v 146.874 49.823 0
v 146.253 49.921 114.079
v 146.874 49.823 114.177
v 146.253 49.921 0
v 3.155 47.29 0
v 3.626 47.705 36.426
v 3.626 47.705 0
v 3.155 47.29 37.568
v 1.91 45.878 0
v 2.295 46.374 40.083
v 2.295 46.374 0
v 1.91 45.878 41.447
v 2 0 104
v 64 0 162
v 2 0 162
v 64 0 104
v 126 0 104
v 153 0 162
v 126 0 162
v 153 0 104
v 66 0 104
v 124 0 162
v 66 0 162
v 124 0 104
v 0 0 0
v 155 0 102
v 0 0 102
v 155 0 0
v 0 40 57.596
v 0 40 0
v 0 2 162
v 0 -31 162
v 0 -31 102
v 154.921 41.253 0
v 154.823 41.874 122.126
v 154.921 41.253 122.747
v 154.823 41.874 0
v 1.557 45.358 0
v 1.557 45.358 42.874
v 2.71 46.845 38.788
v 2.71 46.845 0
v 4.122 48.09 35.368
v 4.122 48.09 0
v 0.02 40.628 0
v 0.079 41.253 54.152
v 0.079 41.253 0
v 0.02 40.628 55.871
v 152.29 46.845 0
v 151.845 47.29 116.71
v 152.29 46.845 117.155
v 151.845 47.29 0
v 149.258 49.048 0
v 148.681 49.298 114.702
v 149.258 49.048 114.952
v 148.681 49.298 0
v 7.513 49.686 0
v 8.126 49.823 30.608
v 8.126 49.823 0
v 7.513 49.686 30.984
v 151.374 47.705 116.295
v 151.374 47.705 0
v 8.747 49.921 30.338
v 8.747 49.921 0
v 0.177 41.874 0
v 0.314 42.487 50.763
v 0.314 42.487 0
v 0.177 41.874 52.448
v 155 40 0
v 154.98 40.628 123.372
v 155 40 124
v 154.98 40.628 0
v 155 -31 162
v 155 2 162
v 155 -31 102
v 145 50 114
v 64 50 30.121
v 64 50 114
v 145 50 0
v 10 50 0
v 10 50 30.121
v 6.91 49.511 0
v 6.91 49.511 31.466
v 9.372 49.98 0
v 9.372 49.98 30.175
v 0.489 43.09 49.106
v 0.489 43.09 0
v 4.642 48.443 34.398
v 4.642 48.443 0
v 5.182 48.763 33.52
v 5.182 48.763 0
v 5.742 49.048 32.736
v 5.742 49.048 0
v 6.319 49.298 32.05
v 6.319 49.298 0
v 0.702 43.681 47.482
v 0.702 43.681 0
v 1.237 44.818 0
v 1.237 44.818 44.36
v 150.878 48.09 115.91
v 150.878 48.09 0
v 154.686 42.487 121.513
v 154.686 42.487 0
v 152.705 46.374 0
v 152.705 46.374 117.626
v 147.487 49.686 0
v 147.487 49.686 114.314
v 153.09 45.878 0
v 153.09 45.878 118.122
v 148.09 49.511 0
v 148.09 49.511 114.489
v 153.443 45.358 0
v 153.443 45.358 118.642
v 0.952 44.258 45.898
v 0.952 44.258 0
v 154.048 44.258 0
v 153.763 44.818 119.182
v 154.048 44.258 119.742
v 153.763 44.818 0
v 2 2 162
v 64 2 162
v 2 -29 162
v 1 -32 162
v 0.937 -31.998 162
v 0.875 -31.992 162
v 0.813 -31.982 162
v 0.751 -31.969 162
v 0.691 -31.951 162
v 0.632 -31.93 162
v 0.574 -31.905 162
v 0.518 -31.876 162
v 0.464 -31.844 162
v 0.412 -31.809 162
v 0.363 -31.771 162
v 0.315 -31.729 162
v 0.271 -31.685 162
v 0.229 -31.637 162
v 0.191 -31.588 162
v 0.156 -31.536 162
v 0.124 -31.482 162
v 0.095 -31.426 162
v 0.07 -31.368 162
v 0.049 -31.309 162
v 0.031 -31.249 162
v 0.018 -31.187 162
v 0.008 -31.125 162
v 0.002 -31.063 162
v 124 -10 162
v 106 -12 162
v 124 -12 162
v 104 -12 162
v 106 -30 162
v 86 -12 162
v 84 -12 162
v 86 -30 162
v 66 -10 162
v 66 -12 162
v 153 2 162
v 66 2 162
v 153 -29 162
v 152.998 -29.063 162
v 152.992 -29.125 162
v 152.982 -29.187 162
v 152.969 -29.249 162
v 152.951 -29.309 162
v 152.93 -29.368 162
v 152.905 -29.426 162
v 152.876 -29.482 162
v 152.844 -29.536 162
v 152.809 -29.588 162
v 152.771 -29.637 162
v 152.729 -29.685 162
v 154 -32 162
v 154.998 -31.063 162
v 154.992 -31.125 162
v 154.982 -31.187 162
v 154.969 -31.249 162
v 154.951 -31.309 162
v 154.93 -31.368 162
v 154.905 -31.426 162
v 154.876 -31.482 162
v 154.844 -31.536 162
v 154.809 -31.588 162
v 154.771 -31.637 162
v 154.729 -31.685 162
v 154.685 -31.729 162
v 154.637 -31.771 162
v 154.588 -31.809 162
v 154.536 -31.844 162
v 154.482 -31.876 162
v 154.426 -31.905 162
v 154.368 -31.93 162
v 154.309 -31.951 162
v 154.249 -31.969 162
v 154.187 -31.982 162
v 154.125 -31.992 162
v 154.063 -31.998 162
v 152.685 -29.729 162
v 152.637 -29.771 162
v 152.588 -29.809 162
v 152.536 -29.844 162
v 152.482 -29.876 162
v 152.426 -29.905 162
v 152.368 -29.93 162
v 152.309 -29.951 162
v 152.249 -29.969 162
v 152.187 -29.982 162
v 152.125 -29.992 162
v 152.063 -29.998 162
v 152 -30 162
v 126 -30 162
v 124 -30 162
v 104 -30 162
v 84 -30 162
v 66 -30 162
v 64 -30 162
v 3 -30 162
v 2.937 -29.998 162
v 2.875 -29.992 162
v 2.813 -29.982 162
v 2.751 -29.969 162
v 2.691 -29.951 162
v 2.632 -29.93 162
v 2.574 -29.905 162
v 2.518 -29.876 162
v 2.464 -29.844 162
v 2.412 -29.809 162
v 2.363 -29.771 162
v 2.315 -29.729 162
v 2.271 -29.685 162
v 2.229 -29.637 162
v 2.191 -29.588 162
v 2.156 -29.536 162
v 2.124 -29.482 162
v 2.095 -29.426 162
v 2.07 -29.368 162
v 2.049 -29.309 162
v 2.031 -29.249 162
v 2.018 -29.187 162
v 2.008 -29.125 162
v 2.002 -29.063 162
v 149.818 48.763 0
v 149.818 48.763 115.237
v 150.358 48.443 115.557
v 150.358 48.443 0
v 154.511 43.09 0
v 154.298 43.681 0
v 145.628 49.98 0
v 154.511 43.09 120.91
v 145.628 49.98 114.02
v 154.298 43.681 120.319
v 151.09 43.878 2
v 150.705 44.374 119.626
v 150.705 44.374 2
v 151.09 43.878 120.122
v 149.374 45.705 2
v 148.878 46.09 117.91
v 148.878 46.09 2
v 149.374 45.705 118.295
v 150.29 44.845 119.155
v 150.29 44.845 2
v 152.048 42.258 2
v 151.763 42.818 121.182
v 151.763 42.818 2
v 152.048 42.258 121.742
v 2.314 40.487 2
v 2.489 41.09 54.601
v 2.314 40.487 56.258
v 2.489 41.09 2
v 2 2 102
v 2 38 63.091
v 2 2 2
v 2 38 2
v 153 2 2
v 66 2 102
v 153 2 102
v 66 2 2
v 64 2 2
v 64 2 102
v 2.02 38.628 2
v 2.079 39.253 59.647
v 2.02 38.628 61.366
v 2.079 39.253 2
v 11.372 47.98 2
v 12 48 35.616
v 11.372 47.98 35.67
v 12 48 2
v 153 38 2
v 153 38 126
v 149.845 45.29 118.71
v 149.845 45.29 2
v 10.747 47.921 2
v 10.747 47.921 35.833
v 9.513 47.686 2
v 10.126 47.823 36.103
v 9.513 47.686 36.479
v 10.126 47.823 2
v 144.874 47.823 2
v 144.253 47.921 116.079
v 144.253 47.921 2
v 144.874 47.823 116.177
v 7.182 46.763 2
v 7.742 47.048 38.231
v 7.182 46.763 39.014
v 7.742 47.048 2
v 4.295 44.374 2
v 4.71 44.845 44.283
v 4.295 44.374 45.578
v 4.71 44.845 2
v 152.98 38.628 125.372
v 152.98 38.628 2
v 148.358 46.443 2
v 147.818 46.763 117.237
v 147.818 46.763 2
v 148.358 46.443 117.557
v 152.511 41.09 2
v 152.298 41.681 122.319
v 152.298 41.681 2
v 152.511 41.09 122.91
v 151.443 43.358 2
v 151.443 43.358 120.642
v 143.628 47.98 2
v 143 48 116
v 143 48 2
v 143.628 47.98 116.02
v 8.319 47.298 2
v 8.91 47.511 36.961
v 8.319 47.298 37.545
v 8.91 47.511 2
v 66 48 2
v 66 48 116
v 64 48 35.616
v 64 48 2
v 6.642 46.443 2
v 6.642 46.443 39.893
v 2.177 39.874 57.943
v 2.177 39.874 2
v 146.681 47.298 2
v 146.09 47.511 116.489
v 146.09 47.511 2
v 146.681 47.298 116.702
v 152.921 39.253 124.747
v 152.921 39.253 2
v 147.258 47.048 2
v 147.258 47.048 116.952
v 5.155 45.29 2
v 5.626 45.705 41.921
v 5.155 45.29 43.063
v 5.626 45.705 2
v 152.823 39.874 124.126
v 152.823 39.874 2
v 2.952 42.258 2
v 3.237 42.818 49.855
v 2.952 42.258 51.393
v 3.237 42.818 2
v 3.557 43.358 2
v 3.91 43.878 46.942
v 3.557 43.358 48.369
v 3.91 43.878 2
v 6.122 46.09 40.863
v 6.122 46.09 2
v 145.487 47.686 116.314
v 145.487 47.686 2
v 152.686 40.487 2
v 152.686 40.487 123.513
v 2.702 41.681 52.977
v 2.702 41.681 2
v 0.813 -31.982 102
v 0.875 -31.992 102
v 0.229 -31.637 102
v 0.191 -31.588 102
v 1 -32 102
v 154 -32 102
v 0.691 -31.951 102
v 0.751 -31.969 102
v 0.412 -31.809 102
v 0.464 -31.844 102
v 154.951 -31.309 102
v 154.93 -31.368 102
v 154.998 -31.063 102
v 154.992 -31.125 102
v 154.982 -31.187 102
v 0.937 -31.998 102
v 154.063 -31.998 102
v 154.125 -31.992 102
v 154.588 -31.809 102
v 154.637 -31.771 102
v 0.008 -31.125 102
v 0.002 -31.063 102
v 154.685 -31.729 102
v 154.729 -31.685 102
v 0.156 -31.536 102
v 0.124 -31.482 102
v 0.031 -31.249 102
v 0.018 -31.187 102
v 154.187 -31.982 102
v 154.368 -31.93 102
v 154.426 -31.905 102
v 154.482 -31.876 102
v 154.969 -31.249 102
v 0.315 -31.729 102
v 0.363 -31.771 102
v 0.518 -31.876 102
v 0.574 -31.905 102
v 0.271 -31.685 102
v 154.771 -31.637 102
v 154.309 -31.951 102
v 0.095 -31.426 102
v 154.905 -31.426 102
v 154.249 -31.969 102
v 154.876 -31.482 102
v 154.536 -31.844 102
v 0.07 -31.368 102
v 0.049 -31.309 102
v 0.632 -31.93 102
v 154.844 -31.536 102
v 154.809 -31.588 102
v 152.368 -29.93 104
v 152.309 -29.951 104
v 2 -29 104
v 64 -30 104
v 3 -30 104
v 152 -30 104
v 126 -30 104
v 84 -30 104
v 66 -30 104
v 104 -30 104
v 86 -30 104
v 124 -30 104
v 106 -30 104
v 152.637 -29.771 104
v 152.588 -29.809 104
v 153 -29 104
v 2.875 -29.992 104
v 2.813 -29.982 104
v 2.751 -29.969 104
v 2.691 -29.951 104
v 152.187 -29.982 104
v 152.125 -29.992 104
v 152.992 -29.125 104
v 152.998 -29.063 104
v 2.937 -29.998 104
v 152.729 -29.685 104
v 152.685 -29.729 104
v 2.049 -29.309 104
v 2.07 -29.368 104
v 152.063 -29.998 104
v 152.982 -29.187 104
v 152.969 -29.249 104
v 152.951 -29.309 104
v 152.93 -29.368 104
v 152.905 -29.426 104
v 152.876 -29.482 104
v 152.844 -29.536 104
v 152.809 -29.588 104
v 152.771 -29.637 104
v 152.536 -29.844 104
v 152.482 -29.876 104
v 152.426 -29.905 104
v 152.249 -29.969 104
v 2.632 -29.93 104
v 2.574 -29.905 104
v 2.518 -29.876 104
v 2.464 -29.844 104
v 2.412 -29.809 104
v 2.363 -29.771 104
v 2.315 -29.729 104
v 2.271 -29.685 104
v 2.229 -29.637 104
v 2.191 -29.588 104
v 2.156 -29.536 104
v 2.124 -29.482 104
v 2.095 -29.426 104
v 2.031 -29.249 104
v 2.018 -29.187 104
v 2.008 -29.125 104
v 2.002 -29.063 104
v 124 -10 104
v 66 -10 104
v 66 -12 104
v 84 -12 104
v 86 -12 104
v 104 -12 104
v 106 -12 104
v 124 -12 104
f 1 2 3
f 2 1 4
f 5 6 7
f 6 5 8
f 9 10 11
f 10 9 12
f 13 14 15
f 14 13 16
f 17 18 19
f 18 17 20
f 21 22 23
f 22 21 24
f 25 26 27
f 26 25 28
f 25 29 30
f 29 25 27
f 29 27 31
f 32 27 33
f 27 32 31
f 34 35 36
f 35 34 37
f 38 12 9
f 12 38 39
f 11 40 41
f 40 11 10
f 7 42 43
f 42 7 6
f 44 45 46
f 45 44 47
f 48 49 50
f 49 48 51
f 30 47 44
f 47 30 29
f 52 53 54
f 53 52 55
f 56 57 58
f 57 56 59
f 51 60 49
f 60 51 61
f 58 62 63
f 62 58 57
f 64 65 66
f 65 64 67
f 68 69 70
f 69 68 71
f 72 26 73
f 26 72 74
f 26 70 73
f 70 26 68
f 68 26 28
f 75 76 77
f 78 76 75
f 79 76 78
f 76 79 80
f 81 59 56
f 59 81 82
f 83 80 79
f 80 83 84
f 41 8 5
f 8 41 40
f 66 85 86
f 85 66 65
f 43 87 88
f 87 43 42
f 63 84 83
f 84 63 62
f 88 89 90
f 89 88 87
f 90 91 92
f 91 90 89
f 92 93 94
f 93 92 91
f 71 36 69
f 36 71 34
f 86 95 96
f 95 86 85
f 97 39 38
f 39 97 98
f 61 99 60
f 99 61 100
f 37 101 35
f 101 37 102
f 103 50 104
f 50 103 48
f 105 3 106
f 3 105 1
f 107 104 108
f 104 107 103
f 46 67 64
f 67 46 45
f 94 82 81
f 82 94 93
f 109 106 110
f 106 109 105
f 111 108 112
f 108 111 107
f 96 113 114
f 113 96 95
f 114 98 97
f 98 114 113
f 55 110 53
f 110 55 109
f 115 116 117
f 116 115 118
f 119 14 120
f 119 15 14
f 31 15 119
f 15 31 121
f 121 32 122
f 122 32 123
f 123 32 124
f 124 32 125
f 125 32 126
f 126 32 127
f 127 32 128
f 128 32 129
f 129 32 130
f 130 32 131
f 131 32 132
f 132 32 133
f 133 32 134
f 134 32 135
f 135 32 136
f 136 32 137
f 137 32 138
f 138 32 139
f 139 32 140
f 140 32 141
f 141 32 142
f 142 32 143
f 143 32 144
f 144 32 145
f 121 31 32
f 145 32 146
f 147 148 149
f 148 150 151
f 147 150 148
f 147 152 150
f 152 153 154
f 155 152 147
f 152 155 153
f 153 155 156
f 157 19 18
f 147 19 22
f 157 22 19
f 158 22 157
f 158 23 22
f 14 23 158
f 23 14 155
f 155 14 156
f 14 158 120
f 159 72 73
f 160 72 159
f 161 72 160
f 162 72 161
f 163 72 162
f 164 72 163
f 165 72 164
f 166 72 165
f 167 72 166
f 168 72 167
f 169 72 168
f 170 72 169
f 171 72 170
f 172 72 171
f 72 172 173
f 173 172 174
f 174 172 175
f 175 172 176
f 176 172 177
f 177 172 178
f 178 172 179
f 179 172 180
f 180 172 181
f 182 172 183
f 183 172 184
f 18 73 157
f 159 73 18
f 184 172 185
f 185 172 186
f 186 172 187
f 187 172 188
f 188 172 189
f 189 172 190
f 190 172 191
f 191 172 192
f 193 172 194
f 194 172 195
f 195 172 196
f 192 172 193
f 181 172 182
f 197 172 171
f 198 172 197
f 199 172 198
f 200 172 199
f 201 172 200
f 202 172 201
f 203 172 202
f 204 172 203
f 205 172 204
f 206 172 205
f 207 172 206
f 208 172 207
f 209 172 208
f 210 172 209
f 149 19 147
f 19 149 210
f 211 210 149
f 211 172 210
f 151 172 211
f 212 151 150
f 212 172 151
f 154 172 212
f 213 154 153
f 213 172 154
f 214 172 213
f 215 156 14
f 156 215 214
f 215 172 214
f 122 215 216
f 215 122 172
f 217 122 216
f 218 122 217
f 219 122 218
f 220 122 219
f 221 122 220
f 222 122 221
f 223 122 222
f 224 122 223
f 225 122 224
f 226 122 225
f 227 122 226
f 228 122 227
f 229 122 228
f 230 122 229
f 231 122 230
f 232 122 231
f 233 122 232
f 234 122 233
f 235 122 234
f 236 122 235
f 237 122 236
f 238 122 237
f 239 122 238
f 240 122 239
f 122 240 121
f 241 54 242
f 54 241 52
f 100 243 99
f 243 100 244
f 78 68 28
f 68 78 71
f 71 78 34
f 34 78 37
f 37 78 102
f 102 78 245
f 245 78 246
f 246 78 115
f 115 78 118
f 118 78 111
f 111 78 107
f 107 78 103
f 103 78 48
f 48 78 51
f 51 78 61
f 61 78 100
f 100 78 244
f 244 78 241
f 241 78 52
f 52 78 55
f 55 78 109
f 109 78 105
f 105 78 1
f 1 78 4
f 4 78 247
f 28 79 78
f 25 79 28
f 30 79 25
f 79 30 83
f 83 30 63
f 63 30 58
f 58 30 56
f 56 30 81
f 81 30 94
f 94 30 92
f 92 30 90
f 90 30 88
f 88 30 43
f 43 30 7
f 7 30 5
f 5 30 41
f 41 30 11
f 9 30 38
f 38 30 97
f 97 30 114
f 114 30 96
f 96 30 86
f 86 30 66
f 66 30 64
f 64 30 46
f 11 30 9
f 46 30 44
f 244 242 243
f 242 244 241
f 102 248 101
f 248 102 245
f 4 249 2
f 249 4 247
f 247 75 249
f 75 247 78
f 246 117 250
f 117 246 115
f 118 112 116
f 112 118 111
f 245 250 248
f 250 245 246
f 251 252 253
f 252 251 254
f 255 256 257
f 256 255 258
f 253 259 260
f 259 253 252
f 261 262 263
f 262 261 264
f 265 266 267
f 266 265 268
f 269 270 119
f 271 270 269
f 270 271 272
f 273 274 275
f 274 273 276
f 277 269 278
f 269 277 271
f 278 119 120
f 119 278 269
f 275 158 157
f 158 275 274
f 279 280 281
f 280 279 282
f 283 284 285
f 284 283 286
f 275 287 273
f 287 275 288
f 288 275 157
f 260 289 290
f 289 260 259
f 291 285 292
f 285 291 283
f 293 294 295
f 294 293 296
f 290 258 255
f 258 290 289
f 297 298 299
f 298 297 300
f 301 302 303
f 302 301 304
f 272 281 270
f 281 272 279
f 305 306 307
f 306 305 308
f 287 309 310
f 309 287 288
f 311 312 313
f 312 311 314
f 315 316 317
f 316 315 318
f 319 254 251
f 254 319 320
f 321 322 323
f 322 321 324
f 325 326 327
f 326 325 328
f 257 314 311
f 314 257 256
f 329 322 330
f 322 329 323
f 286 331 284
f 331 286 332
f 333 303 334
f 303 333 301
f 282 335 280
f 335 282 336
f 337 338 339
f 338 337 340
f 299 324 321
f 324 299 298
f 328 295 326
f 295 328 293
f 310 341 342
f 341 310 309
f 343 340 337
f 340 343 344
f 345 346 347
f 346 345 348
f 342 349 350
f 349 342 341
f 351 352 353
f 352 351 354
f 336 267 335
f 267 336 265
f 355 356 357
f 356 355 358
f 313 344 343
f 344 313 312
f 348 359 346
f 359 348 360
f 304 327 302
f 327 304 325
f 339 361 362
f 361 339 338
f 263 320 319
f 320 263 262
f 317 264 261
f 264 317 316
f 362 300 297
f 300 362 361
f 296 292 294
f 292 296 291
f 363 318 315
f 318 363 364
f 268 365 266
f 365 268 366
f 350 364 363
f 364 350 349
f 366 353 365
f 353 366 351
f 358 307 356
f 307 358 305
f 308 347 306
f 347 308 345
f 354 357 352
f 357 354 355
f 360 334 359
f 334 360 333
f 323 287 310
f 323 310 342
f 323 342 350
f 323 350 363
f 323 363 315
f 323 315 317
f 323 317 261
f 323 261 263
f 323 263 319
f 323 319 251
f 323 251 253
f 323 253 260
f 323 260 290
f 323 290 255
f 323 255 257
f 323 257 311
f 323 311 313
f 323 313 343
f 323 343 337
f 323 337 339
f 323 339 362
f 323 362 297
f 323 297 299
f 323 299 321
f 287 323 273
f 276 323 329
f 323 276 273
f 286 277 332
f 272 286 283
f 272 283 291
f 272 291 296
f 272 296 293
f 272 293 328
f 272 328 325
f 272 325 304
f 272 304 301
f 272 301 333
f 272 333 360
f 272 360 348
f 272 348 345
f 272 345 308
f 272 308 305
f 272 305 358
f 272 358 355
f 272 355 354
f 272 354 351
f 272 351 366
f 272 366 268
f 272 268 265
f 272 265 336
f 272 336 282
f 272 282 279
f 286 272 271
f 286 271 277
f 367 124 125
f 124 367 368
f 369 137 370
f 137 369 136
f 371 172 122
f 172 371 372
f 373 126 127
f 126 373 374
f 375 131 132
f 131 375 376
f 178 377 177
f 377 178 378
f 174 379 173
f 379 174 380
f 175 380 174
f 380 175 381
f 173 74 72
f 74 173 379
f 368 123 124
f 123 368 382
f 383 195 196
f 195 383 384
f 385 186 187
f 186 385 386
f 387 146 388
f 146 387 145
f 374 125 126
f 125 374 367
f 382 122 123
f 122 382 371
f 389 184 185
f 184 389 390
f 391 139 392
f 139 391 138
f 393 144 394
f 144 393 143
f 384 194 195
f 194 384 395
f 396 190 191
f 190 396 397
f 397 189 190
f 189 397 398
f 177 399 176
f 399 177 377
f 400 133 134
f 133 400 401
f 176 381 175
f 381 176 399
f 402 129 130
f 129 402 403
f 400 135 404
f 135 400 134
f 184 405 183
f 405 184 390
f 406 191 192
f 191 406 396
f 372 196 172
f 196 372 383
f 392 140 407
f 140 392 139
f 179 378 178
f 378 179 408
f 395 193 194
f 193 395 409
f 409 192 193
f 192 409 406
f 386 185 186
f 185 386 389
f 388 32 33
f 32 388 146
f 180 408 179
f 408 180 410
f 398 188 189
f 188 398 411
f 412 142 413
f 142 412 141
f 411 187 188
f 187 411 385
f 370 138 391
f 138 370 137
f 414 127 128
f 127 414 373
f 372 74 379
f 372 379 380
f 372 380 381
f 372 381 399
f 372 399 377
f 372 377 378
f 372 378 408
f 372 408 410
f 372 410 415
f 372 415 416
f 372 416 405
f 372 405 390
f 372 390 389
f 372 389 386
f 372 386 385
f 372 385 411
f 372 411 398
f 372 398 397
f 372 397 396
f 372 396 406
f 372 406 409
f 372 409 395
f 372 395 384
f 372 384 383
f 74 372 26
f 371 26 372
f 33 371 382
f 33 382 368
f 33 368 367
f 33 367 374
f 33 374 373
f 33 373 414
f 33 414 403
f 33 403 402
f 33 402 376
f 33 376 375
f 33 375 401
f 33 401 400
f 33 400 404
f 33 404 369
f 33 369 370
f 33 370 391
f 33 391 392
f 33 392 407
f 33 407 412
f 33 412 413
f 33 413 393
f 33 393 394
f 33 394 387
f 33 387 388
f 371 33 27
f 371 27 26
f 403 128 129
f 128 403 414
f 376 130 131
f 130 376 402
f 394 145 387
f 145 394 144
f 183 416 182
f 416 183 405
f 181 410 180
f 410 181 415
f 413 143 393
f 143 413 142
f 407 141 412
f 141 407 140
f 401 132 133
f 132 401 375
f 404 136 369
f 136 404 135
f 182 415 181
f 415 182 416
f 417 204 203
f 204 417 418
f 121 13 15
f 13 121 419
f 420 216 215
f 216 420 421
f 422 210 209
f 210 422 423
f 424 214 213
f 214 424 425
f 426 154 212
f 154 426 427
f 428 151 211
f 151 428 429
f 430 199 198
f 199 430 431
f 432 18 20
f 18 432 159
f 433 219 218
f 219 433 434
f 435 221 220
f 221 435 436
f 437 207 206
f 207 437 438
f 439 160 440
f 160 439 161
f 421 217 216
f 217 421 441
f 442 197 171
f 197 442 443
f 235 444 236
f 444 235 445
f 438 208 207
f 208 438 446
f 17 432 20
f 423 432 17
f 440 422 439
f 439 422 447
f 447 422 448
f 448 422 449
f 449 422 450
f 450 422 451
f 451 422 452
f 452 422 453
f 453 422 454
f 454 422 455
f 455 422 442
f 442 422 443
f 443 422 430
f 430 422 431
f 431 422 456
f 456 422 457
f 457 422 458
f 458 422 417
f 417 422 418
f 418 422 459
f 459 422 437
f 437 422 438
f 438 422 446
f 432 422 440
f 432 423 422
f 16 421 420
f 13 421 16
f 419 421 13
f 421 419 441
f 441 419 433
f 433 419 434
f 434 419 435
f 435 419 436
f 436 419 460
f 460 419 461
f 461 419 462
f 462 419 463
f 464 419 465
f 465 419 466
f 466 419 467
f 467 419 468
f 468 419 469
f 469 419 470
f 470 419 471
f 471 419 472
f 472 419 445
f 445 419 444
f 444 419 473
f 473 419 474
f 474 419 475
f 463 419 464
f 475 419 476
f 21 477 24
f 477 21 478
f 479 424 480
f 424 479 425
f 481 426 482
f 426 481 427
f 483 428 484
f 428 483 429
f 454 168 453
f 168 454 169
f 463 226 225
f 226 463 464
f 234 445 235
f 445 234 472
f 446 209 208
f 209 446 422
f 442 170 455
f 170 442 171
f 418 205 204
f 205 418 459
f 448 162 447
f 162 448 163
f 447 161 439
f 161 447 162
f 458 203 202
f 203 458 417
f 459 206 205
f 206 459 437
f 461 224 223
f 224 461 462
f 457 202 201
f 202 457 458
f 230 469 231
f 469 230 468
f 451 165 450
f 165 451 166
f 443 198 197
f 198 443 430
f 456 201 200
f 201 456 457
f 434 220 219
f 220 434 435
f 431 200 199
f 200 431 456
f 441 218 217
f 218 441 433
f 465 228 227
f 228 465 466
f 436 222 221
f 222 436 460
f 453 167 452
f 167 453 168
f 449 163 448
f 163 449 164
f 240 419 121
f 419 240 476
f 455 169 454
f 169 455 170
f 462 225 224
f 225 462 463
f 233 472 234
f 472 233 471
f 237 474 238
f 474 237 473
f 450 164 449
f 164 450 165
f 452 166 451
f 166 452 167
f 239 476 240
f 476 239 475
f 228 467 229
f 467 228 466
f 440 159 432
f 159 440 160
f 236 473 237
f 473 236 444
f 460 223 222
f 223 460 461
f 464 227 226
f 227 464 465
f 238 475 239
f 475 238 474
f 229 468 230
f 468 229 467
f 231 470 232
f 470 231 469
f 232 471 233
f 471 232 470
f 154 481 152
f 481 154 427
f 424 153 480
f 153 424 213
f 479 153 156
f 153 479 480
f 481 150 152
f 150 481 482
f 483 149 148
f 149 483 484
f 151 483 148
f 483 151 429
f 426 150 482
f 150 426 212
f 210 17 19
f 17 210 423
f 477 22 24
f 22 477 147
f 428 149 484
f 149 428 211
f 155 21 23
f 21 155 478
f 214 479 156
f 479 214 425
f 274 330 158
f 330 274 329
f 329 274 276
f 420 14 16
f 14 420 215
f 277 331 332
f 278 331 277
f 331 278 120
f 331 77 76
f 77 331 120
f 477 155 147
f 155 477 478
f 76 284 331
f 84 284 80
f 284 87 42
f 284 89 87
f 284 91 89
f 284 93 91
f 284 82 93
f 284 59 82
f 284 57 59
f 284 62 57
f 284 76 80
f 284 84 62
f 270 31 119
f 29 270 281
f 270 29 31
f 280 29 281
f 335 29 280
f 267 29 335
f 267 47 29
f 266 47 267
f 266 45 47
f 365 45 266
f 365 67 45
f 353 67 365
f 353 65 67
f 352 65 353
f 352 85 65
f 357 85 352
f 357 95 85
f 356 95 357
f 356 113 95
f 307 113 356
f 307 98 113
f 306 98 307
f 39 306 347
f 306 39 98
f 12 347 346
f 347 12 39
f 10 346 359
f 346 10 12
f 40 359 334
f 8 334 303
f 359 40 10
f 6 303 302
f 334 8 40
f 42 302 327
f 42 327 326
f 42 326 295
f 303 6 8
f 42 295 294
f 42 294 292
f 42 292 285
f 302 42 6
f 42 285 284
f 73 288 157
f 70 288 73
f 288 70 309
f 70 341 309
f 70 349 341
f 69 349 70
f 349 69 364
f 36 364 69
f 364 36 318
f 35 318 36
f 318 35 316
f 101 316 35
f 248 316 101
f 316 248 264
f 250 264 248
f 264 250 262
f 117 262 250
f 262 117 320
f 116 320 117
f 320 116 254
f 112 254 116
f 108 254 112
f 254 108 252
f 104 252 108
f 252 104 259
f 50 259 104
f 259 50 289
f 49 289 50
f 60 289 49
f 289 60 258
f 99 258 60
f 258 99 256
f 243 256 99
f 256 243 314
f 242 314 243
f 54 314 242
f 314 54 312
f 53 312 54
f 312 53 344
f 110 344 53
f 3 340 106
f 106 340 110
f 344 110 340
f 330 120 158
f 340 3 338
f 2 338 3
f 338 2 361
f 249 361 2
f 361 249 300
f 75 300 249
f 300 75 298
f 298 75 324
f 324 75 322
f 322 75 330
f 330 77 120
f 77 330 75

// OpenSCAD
// Copyright (C) 2020, Vishal Verma
// SPDX-License-Identifier: GPL-2.0-only

$fn=100;

len = 155;
hbase = 102;
htop = 60;
wall = 2;
box_y = 32 + wall;
wid = 84 - box_y;
radius = 10;
part1 = 50;
lpart = 64;
ant_d = 18;
mid_cut_r = 40;

htot = hbase + htop;

module curve_box(x, y, h, r, w)
{
    difference() {
        hull() {
            cube([x, 10, h]);
            translate([r, y-r, 0]) cylinder(r=r, h=h);
            translate([x-r, y-r, 0]) cylinder(r=r, h=h);
        }
            hull() {
                translate([w, w, w]) cube([x-(2*w), 10, h]);
                translate([r+w, y-r-w, w]) cylinder(r=r, h=h);
                translate([x-r-w, y-r-w, w]) cylinder(r=r, h=h);
        }
    }
}

difference() {
    union() {
        // lower and upper main boxes
        curve_box(len, wid, htot, radius, wall);
        translate([len, wall, hbase])
            rotate([0, 0, 180])
                curve_box(len, box_y, htop, 1, wall);
        
        // upper main partition
        translate([lpart, -box_y + wall, hbase])
            cube([wall, box_y - wall, htop]);
        
        // upper antenna x partition
        translate([lpart, -box_y + ant_d + 2 * wall, hbase])
            cube([len - lpart - ant_d - ant_d + 3 * wall, wall, htop]);
        
        // upper antenna y partitions
        for ( i = [1 : 3] ){
            if (i == 3) {
                translate([lpart + ((wall + ant_d) * i), -box_y + wall, hbase])
                    cube([wall, box_y - wall, htop]);
            } else {
                translate([lpart + ((wall + ant_d) * i), -box_y + wall, hbase])
                    cube([wall, box_y + 2 * wall - ant_d, htop]);
            }
        }
        
        // lower main partition
        translate([lpart, 0, 0])
            cube([wall, wid, htot]);
    }
    
    // angle cut radio side
    translate([-1, wall, htot])
        rotate([-70, 0, 0])
            cube([lpart + 1, len+100, len]);
    
    // angle cut mic side
    translate([lpart - 1, wall, htot])
        rotate([-45, 0, 0])
            cube([len - lpart + 2, len+100, len]);
}
